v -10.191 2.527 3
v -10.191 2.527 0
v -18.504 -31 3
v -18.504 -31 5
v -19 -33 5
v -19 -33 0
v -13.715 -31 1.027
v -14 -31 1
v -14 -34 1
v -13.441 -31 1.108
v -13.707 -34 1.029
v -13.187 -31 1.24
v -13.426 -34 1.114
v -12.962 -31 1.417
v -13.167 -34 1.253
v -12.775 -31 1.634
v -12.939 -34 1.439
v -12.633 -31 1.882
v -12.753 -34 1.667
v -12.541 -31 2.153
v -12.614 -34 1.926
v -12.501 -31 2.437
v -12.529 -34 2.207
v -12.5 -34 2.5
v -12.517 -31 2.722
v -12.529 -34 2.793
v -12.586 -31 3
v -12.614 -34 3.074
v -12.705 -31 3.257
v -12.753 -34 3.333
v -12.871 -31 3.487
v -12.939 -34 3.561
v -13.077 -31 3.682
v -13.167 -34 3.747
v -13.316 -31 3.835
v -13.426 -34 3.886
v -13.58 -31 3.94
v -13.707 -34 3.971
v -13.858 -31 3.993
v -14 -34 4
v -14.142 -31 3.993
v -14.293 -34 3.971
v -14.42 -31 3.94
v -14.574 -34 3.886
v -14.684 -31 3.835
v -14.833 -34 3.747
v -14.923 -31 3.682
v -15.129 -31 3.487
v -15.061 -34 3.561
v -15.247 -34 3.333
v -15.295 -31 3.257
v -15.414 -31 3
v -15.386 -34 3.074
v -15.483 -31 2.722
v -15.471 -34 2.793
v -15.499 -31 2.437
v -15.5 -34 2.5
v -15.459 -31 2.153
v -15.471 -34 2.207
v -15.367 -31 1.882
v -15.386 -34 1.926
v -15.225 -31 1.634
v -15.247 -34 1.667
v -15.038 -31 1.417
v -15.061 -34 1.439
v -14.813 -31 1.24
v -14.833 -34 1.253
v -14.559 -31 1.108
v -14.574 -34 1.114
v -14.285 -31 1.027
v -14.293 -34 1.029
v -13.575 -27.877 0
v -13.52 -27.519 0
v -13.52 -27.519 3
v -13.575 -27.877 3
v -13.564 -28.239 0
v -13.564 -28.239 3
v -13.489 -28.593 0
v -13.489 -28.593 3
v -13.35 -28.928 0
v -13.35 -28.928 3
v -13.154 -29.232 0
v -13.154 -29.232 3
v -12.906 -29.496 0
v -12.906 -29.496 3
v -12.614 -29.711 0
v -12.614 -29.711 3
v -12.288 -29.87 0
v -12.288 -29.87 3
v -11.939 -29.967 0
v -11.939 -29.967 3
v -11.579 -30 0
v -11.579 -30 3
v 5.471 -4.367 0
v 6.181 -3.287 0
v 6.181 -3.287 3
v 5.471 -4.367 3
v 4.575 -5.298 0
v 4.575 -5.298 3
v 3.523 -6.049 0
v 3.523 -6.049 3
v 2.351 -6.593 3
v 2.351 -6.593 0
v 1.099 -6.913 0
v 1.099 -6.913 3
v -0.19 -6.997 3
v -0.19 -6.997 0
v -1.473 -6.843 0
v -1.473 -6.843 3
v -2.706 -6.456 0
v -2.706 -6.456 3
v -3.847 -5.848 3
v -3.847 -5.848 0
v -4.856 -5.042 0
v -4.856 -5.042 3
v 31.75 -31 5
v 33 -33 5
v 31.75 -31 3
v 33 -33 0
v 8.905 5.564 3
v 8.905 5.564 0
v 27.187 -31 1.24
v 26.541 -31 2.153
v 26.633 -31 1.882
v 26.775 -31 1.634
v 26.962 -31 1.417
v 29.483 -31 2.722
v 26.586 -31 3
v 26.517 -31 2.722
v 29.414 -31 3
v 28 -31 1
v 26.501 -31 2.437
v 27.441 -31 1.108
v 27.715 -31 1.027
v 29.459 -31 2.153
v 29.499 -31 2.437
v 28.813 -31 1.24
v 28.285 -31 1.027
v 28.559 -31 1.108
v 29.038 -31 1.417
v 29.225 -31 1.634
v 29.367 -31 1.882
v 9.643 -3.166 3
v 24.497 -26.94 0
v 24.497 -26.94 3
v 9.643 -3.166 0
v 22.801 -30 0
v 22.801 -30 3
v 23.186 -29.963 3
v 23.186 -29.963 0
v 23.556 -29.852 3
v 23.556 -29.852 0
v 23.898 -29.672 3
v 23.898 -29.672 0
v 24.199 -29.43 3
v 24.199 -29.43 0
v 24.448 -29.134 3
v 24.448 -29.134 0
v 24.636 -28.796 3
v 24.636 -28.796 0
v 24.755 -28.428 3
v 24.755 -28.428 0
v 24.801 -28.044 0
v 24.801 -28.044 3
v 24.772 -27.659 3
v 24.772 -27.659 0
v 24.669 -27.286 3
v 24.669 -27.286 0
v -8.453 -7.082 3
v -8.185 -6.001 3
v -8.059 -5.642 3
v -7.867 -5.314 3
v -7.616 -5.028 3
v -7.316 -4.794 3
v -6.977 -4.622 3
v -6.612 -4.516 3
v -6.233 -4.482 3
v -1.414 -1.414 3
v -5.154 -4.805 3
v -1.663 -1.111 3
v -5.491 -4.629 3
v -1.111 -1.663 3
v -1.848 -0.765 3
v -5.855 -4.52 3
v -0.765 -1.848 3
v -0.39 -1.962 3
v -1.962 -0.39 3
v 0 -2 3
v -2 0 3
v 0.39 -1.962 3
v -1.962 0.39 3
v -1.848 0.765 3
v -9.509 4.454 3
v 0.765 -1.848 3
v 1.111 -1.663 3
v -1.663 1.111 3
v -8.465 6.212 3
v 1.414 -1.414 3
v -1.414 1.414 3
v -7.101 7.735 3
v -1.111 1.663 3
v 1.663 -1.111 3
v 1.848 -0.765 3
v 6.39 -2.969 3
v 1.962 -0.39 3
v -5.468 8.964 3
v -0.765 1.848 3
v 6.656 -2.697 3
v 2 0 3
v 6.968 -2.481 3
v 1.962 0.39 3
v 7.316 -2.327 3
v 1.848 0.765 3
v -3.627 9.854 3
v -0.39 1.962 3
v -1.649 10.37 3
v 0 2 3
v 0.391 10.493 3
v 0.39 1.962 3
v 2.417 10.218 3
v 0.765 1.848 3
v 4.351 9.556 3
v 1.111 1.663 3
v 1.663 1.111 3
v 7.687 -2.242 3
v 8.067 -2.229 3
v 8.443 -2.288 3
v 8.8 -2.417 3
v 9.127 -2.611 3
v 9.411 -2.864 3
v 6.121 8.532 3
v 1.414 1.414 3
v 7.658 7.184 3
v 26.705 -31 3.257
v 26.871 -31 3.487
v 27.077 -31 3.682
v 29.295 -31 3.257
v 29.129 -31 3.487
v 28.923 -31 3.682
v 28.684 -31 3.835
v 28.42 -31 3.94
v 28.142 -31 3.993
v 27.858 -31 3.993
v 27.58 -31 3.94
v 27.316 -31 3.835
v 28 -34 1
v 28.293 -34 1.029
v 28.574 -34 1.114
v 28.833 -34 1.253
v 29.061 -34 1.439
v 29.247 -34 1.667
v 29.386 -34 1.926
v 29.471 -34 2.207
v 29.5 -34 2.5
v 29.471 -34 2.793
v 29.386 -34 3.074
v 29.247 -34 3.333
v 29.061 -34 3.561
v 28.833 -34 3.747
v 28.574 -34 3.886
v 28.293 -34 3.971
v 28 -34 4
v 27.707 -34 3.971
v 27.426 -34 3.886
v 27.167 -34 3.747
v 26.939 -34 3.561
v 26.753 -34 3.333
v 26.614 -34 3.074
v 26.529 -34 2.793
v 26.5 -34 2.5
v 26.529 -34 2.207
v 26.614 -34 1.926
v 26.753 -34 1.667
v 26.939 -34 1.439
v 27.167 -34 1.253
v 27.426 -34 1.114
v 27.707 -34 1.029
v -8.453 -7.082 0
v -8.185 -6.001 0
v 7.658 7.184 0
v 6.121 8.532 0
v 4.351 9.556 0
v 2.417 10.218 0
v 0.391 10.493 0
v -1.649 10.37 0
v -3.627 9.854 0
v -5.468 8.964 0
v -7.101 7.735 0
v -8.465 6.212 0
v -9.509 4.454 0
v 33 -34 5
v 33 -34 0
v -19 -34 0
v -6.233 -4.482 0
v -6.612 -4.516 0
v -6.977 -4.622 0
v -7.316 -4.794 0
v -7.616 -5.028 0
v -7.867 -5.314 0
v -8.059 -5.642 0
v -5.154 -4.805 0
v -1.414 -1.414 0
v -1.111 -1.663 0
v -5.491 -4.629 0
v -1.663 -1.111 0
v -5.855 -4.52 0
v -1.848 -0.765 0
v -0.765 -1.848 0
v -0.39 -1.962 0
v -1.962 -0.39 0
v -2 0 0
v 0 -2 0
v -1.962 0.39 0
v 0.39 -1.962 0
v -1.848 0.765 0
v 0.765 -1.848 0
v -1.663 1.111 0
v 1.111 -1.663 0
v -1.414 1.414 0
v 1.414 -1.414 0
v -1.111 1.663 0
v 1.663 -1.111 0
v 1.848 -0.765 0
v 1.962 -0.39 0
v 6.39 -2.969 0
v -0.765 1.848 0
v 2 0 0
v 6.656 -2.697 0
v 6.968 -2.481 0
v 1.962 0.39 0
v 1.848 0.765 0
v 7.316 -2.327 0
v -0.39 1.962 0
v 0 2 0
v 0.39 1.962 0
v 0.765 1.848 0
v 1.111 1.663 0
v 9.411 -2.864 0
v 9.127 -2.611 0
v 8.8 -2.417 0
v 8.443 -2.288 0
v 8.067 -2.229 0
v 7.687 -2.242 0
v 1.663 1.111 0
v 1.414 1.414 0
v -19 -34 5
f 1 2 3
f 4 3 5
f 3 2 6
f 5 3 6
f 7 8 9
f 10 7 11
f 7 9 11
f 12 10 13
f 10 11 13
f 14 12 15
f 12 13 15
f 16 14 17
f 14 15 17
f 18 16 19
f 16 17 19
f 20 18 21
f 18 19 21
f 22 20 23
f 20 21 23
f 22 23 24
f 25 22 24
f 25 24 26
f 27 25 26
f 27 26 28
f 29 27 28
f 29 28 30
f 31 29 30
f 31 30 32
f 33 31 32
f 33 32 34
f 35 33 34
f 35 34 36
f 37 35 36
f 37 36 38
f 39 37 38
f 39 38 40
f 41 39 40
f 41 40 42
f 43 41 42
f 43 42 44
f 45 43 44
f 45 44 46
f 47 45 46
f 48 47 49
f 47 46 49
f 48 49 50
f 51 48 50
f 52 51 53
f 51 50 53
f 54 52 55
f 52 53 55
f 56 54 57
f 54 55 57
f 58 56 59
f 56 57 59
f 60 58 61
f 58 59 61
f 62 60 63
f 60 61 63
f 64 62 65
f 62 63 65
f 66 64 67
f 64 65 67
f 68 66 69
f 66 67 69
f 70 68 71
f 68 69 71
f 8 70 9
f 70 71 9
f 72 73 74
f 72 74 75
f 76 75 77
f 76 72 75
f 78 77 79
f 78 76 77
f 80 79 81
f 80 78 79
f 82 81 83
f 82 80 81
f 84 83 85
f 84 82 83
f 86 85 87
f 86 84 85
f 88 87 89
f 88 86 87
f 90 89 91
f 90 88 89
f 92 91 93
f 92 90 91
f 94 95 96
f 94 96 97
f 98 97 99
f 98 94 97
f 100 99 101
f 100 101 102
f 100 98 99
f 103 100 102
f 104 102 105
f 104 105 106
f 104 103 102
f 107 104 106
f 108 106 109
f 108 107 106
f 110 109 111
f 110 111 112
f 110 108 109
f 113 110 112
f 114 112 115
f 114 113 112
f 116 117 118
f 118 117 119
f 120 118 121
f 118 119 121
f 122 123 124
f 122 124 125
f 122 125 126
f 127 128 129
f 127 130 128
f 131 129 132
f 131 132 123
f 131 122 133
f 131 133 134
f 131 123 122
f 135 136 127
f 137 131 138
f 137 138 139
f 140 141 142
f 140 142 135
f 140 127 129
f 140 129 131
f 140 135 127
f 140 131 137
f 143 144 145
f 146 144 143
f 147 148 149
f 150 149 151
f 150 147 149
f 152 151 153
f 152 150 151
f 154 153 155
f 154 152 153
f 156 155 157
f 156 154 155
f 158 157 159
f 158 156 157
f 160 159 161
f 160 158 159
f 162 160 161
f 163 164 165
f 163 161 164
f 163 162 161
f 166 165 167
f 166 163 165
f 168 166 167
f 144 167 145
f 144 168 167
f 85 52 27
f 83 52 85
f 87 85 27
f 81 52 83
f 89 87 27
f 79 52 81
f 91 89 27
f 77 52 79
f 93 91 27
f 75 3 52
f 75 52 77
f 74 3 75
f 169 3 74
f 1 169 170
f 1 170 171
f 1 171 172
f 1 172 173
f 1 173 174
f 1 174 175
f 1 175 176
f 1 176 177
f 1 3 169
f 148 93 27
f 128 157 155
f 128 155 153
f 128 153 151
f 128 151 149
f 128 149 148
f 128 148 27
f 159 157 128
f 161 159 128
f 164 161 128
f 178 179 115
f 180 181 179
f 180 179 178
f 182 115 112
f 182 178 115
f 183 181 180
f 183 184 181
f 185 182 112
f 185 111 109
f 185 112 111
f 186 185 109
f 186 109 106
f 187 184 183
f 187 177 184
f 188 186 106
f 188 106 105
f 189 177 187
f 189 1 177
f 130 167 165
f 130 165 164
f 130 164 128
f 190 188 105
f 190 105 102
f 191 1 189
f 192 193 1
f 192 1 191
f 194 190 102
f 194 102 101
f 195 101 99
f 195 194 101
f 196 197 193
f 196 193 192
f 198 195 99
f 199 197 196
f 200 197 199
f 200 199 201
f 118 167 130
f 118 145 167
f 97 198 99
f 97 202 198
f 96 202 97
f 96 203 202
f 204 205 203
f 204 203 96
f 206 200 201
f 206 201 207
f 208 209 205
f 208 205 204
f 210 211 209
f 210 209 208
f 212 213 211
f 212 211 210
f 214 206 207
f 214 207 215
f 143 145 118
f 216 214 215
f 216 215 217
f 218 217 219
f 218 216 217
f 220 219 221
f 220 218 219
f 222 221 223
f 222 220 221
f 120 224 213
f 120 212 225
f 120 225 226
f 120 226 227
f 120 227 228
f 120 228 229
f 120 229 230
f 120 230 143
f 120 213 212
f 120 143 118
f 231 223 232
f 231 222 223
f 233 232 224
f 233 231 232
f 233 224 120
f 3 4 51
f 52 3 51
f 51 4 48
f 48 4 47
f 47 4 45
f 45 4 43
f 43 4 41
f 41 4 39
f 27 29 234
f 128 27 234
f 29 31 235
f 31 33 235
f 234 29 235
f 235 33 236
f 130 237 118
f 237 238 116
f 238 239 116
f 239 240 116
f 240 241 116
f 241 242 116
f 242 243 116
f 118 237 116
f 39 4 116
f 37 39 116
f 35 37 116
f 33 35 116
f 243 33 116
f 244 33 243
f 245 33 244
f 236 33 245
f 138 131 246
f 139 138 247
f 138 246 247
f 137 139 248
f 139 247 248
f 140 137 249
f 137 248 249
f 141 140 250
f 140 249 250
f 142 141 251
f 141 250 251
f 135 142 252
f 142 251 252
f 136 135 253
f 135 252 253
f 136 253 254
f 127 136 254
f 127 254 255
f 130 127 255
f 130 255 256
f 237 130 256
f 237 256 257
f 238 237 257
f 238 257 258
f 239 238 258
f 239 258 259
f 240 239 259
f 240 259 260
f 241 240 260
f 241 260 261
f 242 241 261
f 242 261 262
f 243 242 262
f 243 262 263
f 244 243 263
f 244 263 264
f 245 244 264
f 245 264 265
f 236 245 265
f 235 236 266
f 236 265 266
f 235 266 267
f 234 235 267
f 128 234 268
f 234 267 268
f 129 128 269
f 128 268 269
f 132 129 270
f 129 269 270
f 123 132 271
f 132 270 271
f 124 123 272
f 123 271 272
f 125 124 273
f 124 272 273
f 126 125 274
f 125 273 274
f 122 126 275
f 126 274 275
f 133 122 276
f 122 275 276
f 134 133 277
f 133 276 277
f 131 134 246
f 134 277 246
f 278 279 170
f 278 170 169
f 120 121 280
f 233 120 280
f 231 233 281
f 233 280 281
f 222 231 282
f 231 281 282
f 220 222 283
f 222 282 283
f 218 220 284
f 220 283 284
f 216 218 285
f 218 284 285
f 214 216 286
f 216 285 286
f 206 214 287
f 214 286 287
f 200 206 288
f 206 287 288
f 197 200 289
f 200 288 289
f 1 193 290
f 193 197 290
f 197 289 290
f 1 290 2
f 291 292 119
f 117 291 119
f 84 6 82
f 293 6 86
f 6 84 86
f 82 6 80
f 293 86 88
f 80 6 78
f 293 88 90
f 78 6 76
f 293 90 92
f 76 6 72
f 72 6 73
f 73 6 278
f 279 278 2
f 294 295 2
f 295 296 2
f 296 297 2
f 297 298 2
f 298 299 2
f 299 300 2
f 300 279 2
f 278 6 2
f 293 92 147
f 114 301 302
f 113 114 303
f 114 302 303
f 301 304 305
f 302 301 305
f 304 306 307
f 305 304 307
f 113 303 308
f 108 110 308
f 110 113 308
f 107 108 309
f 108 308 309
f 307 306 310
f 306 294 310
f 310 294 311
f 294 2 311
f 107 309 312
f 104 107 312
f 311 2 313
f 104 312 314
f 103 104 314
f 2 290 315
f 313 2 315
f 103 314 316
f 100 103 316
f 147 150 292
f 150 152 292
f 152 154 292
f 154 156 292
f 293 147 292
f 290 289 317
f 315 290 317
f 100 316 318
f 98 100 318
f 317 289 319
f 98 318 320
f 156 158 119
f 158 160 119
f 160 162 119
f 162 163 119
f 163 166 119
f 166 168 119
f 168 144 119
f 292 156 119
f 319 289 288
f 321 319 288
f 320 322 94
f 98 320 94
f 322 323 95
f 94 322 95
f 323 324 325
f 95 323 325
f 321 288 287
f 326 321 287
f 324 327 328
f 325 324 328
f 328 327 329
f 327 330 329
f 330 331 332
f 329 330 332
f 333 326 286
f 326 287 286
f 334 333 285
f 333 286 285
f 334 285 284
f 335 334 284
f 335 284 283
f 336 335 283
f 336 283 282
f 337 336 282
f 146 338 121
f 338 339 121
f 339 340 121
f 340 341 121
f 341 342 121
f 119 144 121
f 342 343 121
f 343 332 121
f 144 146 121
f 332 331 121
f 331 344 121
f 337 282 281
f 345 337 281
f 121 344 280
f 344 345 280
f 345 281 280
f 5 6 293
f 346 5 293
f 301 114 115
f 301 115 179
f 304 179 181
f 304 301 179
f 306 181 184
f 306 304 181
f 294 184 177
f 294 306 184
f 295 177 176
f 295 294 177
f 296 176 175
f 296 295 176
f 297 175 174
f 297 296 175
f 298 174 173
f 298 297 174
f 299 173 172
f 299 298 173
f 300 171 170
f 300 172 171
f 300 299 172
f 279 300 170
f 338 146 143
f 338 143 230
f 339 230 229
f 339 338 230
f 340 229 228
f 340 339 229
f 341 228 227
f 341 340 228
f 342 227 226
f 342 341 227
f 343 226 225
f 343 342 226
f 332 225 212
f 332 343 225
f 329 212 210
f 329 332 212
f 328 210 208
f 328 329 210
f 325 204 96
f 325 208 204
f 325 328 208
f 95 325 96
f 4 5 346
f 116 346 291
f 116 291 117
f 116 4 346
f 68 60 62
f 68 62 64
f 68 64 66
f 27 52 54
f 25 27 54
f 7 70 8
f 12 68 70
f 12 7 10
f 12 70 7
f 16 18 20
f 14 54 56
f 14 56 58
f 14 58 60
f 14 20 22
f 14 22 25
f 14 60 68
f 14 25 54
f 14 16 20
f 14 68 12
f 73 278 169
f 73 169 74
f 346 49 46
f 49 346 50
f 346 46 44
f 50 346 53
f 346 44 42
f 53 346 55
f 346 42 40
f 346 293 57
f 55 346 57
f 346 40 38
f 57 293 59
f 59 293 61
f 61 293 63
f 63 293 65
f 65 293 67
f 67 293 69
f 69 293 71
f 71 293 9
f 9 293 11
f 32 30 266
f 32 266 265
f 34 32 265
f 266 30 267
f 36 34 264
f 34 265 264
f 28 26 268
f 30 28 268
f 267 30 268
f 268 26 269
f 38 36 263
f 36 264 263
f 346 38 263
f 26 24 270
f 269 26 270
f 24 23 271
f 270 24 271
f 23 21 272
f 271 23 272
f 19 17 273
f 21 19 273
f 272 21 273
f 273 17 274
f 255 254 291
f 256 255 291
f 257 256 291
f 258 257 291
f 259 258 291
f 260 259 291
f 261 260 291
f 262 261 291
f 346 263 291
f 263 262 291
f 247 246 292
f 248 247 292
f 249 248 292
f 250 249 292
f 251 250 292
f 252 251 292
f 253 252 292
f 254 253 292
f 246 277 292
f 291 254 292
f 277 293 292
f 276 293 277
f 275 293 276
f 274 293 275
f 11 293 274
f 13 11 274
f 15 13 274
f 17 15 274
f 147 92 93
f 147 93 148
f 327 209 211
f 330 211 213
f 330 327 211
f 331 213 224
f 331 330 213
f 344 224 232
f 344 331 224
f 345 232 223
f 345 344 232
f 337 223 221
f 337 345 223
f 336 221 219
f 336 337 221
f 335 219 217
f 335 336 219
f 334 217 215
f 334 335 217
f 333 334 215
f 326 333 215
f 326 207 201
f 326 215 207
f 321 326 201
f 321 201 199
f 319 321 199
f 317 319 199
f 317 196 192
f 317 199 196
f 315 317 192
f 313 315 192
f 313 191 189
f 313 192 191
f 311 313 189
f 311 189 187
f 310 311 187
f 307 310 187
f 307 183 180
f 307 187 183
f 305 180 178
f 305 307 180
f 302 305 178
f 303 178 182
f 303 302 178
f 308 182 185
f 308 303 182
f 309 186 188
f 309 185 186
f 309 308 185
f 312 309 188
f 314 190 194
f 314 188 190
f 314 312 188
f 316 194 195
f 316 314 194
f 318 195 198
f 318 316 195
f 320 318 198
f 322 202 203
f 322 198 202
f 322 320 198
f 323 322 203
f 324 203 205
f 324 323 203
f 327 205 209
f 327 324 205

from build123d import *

# Parameters (mm, degrees)
SKETCH_1_R          = 2
EXTRUDE_1_DEPTH     = 5
SKETCH_2_W          = 105.590665855
SKETCH_2_H          = 53.734325109
CUT_EXTRUDE_1_DEPTH = 2
SKETCH_4_R          = 1.5
CUT_EXTRUDE_2_DEPTH = 3


with BuildPart() as part:
    # 草图1 → 凸台-拉伸1 (new body)
    with BuildSketch(Plane.XY):
        with BuildLine():
            Line((-10.191413347, 2.526874351), (-19, -33))
            Line((-19, -33), (-19, -34))
            Line((-19, -34), (33, -34))
            Line((33, -34), (33, -33))
            Line((33, -33), (8.904718959, 5.563809869))
            ThreePointArc((8.904718959, 5.563809869), (-1.649133089, 10.369684665), (-10.191413347, 2.526874351))
        make_face()
        Circle(SKETCH_1_R, mode=Mode.SUBTRACT)
        with BuildLine():
            Line((-8.452697078, -7.081843943), (-13.519839571, -27.5186906))
            ThreePointArc((-13.519839571, -27.5186906), (-13.153835237, -29.232351654), (-11.578617982, -30))
            Line((-11.578617982, -30), (22.801020138, -30))
            ThreePointArc((22.801020138, -30), (24.55024091, -28.969652872), (24.497157083, -26.940226692))
            Line((24.497157083, -26.940226692), (9.642502803, -3.165776319))
            ThreePointArc((9.642502803, -3.165776319), (7.876643723, -2.22676529), (6.180506778, -3.286538599))
            ThreePointArc((6.180506778, -3.286538599), (1.099422059, -6.91312311), (-4.856029369, -5.041723789))
            ThreePointArc((-4.856029369, -5.041723789), (-6.797250959, -4.560414389), (-8.184687922, -6.0009069))
            Line((-8.184687922, -6.0009069), (-8.452697078, -7.081843943))
        make_face(mode=Mode.SUBTRACT)
    extrude(amount=EXTRUDE_1_DEPTH)

    # 草图2 → 切除-拉伸1 (cut)
    with BuildSketch(Plane.XY.offset(5)):
        with Locations((1.500851151, -4.132837446)):
            Rectangle(SKETCH_2_W, SKETCH_2_H)
    extrude(amount=-CUT_EXTRUDE_1_DEPTH, mode=Mode.SUBTRACT)

    # 草图4 → 切除-拉伸2 (cut)
    with BuildSketch(Plane(origin=(0, -34, 0), x_dir=(-1, 0, 0), z_dir=(0, -1, 0))):
        with Locations(Location((14, -2.5, 0), (0, 0, 90))):
            Circle(SKETCH_4_R)
        with Locations(Location((-28, -2.5, 0), (0, 0, 90))):
            Circle(SKETCH_4_R)
    extrude(amount=-CUT_EXTRUDE_2_DEPTH, mode=Mode.SUBTRACT)


solid = part.part
